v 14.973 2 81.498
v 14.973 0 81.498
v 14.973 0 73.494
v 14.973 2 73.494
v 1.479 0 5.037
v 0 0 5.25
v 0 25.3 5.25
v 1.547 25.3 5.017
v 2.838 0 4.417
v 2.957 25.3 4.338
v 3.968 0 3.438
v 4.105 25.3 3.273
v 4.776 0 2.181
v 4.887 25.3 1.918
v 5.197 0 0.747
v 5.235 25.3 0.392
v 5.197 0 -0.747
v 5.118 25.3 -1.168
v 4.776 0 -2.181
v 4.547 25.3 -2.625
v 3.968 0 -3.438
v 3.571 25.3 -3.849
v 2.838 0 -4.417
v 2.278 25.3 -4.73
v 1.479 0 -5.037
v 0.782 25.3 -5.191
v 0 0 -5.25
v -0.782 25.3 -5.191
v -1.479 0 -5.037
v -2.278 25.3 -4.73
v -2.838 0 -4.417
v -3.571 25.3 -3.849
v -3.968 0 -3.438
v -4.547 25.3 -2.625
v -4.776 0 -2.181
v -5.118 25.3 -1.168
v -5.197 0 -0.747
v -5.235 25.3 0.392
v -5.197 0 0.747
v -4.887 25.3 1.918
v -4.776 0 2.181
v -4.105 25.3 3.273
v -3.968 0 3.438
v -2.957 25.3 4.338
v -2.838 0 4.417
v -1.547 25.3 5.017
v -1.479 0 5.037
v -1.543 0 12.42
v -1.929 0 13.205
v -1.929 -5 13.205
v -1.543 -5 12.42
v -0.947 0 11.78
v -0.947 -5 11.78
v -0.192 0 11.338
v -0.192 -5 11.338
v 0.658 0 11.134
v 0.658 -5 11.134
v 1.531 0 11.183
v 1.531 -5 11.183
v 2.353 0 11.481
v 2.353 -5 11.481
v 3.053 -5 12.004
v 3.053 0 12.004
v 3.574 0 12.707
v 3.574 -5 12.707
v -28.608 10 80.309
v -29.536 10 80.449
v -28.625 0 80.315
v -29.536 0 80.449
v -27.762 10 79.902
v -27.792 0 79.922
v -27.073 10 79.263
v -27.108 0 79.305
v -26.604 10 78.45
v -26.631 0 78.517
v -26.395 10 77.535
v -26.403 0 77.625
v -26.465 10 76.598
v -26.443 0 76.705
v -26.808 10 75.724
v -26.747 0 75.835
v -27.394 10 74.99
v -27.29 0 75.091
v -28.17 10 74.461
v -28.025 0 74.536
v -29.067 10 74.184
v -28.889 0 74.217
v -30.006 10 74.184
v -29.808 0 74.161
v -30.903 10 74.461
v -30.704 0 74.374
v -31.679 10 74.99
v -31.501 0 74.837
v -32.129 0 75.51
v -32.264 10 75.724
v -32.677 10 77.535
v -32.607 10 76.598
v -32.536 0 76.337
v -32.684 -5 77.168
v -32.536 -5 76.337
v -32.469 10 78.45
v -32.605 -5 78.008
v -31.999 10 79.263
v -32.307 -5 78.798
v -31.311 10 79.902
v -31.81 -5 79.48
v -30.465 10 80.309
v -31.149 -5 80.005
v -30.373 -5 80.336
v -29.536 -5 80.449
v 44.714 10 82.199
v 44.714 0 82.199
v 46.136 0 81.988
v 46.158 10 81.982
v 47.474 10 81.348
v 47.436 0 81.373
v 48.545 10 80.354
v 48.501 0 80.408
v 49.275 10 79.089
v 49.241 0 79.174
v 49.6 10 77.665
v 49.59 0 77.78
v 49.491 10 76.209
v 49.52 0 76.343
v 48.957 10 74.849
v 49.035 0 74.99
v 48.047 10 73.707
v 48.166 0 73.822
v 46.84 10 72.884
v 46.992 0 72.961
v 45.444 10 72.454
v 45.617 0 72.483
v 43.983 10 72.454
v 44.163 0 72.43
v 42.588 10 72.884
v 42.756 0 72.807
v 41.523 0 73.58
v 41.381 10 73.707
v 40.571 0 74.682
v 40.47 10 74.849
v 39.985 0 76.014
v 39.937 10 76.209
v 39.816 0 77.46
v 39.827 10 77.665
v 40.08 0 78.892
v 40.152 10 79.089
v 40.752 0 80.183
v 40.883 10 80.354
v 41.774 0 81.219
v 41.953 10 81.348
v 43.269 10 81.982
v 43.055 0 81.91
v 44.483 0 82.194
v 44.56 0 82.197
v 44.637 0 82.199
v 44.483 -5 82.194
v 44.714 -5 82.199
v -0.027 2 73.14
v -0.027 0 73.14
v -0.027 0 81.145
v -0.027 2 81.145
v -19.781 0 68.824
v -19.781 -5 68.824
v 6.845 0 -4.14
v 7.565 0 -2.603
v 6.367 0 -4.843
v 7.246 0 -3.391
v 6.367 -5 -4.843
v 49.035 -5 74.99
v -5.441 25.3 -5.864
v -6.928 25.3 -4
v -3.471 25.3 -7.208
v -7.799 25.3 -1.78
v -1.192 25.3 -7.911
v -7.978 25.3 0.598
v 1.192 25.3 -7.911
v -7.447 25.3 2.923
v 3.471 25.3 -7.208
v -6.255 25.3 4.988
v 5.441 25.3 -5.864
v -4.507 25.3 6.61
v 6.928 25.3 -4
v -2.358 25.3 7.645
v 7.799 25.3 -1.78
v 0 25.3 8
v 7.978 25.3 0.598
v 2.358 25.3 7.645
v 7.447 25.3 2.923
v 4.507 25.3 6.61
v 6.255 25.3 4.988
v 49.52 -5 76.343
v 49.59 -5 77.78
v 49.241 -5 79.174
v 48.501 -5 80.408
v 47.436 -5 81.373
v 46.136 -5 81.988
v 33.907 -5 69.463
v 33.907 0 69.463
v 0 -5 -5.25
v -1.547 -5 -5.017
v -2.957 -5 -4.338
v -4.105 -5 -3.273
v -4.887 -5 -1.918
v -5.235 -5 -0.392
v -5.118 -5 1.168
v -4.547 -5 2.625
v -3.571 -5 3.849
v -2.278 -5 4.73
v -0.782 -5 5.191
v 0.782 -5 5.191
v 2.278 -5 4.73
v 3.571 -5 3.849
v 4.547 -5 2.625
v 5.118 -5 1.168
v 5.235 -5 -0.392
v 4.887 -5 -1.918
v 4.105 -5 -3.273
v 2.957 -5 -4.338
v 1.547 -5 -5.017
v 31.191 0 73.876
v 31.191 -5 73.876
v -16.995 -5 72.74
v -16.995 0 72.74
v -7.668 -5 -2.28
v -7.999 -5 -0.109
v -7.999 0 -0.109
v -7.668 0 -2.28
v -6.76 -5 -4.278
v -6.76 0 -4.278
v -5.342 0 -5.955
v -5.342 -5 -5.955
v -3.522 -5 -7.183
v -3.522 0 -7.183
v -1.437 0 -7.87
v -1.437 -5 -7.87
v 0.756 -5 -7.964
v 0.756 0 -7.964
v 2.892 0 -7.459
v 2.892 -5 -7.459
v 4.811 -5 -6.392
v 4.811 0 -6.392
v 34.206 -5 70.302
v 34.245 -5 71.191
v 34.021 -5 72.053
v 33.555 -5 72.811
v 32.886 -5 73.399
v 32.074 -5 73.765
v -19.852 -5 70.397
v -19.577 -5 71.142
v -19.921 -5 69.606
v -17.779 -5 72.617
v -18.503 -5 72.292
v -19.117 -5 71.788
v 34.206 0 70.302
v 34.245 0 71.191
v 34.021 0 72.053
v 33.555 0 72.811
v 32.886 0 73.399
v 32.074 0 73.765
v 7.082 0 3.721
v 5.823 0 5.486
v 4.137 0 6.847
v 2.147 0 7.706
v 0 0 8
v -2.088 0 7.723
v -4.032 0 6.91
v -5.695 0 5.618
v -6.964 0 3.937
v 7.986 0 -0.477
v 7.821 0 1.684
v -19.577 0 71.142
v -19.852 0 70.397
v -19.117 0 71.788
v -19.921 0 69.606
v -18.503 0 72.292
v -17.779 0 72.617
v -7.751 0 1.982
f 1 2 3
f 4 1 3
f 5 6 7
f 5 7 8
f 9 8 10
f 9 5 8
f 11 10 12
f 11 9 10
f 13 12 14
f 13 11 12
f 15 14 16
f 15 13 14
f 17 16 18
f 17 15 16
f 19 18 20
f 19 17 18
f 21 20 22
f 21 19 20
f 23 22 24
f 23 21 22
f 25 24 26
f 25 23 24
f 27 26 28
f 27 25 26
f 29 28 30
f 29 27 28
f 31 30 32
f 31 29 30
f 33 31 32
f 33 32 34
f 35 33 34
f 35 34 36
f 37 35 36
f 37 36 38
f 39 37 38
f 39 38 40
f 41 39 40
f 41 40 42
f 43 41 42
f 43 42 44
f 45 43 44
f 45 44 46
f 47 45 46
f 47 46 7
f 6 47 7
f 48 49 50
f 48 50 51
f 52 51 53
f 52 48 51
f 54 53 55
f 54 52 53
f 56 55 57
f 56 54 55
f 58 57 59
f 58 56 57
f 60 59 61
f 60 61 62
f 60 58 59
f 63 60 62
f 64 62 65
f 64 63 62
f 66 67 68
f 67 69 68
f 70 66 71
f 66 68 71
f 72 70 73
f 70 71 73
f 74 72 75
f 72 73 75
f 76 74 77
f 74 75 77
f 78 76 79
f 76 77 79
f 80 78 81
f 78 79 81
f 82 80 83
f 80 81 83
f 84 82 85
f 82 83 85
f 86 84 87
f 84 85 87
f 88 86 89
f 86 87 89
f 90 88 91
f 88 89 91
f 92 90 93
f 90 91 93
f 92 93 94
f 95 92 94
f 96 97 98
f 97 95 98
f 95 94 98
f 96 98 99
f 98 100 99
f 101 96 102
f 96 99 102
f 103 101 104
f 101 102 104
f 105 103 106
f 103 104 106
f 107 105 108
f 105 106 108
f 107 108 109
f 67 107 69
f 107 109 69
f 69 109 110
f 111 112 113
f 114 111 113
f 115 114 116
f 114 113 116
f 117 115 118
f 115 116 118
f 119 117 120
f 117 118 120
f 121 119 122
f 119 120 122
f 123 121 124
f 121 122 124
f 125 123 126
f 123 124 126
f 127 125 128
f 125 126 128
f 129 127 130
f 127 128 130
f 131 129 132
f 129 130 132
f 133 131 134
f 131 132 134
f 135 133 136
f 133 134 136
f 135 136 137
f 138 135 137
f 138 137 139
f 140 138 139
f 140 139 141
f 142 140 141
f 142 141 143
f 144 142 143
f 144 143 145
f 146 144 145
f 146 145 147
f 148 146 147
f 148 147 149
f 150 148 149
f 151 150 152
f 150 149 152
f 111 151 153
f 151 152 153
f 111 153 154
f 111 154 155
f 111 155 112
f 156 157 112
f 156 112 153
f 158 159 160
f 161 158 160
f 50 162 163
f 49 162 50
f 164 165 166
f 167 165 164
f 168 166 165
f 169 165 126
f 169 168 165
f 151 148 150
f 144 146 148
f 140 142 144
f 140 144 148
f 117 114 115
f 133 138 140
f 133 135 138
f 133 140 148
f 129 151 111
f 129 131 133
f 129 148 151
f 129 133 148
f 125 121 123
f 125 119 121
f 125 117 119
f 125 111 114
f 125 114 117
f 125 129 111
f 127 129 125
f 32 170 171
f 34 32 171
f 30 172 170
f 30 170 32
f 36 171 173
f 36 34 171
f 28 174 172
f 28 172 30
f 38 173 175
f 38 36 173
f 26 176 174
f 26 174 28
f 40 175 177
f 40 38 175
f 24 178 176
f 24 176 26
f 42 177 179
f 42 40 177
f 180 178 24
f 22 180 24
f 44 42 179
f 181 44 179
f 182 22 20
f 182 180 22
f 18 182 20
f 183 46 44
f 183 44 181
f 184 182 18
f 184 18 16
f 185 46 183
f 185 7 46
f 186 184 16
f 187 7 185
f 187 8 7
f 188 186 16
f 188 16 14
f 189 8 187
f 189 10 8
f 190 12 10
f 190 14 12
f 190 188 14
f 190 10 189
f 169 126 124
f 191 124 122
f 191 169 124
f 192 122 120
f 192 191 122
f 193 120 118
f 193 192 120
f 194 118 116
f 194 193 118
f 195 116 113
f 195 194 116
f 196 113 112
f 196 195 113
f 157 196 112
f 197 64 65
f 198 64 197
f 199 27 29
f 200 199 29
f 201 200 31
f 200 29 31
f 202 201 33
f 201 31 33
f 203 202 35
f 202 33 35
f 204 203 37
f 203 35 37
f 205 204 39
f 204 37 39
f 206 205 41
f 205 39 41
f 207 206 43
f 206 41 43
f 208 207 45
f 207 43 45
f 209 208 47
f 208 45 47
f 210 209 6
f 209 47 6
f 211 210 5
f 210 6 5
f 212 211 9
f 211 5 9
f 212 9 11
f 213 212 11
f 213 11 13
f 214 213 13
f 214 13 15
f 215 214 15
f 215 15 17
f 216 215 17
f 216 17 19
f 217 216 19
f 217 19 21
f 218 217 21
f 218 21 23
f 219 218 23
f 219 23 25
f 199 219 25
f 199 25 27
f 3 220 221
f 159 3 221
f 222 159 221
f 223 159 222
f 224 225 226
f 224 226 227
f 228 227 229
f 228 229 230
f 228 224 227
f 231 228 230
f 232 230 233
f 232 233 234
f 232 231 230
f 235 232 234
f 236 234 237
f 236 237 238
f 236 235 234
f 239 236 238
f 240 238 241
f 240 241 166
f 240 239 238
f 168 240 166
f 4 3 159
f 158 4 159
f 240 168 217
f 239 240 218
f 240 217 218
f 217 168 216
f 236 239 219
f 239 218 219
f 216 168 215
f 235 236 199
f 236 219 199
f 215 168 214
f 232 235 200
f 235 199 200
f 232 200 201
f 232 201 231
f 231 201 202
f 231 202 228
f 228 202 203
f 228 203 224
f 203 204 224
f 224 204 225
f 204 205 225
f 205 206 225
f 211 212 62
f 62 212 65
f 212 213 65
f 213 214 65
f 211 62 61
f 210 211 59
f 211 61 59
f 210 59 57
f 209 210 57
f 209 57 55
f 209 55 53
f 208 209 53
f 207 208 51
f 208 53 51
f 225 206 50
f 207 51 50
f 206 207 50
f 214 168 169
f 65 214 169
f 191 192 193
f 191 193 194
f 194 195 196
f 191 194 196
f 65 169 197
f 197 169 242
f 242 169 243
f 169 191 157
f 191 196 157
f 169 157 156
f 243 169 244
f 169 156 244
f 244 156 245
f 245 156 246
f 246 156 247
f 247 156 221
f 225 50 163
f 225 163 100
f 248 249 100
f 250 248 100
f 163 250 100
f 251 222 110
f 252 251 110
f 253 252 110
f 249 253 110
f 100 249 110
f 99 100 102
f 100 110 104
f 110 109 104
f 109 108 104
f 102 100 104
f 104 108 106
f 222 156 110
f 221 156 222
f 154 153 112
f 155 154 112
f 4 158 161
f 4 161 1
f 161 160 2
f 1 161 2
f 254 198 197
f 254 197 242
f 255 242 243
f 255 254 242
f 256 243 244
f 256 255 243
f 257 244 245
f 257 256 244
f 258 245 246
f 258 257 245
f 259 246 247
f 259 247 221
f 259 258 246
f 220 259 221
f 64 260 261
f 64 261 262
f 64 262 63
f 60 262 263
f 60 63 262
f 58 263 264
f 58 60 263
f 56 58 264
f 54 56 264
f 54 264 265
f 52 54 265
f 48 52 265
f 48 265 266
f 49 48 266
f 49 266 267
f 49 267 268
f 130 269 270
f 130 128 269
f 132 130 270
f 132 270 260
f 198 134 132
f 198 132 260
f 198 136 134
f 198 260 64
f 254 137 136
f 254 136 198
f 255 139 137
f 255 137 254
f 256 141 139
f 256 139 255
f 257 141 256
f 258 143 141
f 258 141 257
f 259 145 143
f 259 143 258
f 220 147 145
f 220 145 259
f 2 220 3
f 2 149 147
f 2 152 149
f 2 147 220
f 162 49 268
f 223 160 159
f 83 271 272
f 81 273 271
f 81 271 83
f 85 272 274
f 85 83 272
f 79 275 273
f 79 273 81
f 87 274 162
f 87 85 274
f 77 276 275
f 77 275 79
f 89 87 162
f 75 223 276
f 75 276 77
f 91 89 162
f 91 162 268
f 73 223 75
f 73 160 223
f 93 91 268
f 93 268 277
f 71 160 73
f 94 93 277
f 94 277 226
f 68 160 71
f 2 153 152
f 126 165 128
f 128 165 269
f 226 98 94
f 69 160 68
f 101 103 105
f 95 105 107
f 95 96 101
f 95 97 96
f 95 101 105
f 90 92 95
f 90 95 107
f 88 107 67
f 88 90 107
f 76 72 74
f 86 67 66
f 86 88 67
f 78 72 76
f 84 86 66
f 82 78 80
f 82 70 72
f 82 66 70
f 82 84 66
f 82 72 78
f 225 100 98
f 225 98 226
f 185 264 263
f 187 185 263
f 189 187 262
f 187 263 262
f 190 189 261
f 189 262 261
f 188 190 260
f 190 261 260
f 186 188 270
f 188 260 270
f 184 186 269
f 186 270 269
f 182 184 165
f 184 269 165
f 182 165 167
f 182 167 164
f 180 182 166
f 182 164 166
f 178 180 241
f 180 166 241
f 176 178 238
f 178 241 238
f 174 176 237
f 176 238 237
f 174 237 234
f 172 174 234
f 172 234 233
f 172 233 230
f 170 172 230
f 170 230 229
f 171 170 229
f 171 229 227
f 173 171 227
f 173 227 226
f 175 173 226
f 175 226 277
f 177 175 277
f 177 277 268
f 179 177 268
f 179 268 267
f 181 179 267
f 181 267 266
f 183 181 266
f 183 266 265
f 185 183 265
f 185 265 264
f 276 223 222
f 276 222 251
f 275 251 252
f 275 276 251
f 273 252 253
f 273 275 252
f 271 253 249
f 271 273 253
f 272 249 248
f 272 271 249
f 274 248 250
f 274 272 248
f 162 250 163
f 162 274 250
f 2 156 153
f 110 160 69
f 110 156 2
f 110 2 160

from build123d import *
from build123d.topology import SkipClean

# Parameters (mm, degrees)
SKETCH_1_R          = 4.9
EXTRUDE_1_DEPTH     = 25.3
SKETCH_1_R_2        = 3.15
EXTRUDE_1_2_DEPTH   = 25.3
SKETCH_1_R_3        = 8
SKETCH_1_R_4        = 5.25
EXTRUDE_1_3_DEPTH   = 25.3
EXTRUDE_START       = 5
SKETCH_2_R          = 3.15
EXTRUDE_2_DEPTH     = 5
SKETCH_3_W          = 101.378011207
SKETCH_3_H          = 57.539128355
CUT_EXTRUDE_1_DEPTH = 15.3
CUT_EXTRUDE_2_DEPTH = 100.289108802
FILLET_1_R          = 3
SKETCH_5_R          = 5.25
CUT_EXTRUDE_3_DEPTH = 100.289108802
EXTRUDE_3_DEPTH     = 2


with BuildPart() as part:
    # Эскиз1 → Бобышка-Вытянуть1 (new body)
    with BuildSketch(Plane(origin=(0, 0, 0), x_dir=(1, 0, 0), z_dir=(0, 1, 0))):
        with Locations(Location((44.713737374, -77.299234731, 0), (0, 0, 270))):
            Circle(SKETCH_1_R)
    extrude(amount=EXTRUDE_1_DEPTH)



with BuildPart() as body_2:
    # Эскиз1 → Extrude 1 2 (new body)
    with BuildSketch(Plane(origin=(0, 0, 0), x_dir=(1, 0, 0), z_dir=(0, 1, 0))):
        with Locations(Location((-29.536262626, -77.299234731, 0), (0, 0, 270))):
            Circle(SKETCH_1_R_2)
    extrude(amount=EXTRUDE_1_2_DEPTH)


with BuildPart() as body_3:
    # Эскиз1 → Extrude 1 3 (new body)
    with BuildSketch(Plane(origin=(0, 0, 0), x_dir=(1, 0, 0), z_dir=(0, 1, 0))):
        with Locations(Location((0, 0, 0), (0, 0, 270))):
            Circle(SKETCH_1_R_3)
        with Locations(Location((0, 0, 0), (0, 0, 270))):
            Circle(SKETCH_1_R_4, mode=Mode.SUBTRACT)
    extrude(amount=EXTRUDE_1_3_DEPTH)


with BuildPart() as part_1:
    with SkipClean():  # the faces are left unmerged after this step: merging them gives an invalid solid
        add(part.part)

        add(body_2.part)  # Бобышка-Вытянуть2 merges body 2

        add(body_3.part)  # Бобышка-Вытянуть2 merges body 3
        # Эскиз2 → Бобышка-Вытянуть2 (add)
        with BuildSketch(Plane.XZ.offset(EXTRUDE_START)):
            with BuildLine():
                Line((44.482889179, 82.193793865), (-29.536262626, 80.449234731))
                ThreePointArc((-29.536262626, 80.449234731), (-27.308876266, 79.526621092), (-26.386262626, 77.299234731))
                ThreePointArc((-26.386262626, 77.299234731), (-29.049069338, 74.187138541), (-32.535559579, 76.336572905))
                Line((-32.535559579, 76.336572905), (-7.999251158, -0.109457316))
                ThreePointArc((-7.999251158, -0.109457316), (-2.503564236, -7.598168603), (6.367372109, -4.843198574))
                Line((6.367372109, -4.843198574), (49.035233225, 74.989543494))
                ThreePointArc((49.035233225, 74.989543494), (48.916563034, 79.818412468), (44.713737374, 82.199234731))
                Line((44.713737374, 82.199234731), (44.482889179, 82.193793865))
            make_face()
            with Locations(Location((-29.536262626, 77.299234731, 0), (0, 0, 90))):
                Circle(SKETCH_2_R)
        extrude(amount=-EXTRUDE_2_DEPTH)

    # Эскиз3 → Вырез-Вытянуть1 (cut)
    with SkipClean():  # the faces are left unmerged after this step: merging them gives an invalid solid
        with BuildSketch(Plane(origin=(0, 25.3, 0), x_dir=(1, 0, 0), z_dir=(0, 1, 0))):
            with Locations((10.685297464, -78.742909524)):
                Rectangle(SKETCH_3_W, SKETCH_3_H)
        extrude(amount=-CUT_EXTRUDE_1_DEPTH, mode=Mode.SUBTRACT)

    # Эскиз4 → Вырез-Вытянуть2 (cut, through all)
    with SkipClean():  # the faces are left unmerged after this step: merging them gives an invalid solid
        with BuildSketch(Plane(origin=(0, 0, 0), x_dir=(1, 0, 0), z_dir=(0, 1, 0))):
            Polygon((36.330866648, -73.997214663), (-21.007135718, -72.645813934), (0.235470884, -6.461736097), align=None)
        extrude(amount=-CUT_EXTRUDE_2_DEPTH, mode=Mode.SUBTRACT)

    # Скругление1
    # the kernel refuses this fillet: 3 mm, written as the material it adds along each edge
    with BuildSketch(Plane(origin=(0.235470884, 0, 6.461736097), x_dir=(0.4713655585699632, 0, 0.8819379287648461), z_dir=(0, -1, 0))) as fillet_1_piece_1:
        with BuildLine():
            CenterArc((FILLET_1_R * 2.36056709959, FILLET_1_R), FILLET_1_R, 135.917656387, 134.082343613)
            Line((FILLET_1_R * 1.642226382, FILLET_1_R * 1.69569146426), (0, 0))
            Line((0, 0), (FILLET_1_R * 2.36056709959, 0))
        make_face()
    extrude(amount=5)
    with BuildSketch(Plane(origin=(36.330866648, 0, 73.997214663), x_dir=(-0.4713655585699637, 0, -0.8819379287648459), z_dir=(0, -1, 0))) as fillet_1_piece_2:
        with BuildLine():
            CenterArc((FILLET_1_R * 1.71380475401, -FILLET_1_R), FILLET_1_R, 90, 119.473130073)
            Line((FILLET_1_R * 0.843218222551, -FILLET_1_R * 1.49201533639), (0, 0))
            Line((0, 0), (FILLET_1_R * 1.71380475401, 0))
        make_face()
    extrude(amount=5)
    with BuildSketch(Plane(origin=(-21.007135718, 0, 72.645813934), x_dir=(0.999722366227584, 0, 0.023562480012096054), z_dir=(0, -1, 0))) as fillet_1_piece_3:
        with BuildLine():
            CenterArc((FILLET_1_R * 1.33781102221, -FILLET_1_R), FILLET_1_R, 90, 106.444526314)
            Line((FILLET_1_R * 0.37871675356, -FILLET_1_R * 1.28308688393), (0, 0))
            Line((0, 0), (FILLET_1_R * 1.33781102221, 0))
        make_face()
    extrude(amount=5)

    # Эскиз5 → Вырез-Вытянуть3 (cut, through all)
    with BuildSketch(Plane(origin=(0, 0, 0), x_dir=(1, 0, 0), z_dir=(0, 1, 0))):
        with Locations(Location((0, 0, 0), (0, 0, 90))):
            Circle(SKETCH_5_R)
    extrude(amount=-CUT_EXTRUDE_3_DEPTH, mode=Mode.SUBTRACT)

    # Эскиз6 → Бобышка-Вытянуть3 (add)
    with BuildSketch(Plane(origin=(0, 0, 0), x_dir=(1, 0, 0), z_dir=(0, 1, 0))):
        Polygon((-0.026686724, -73.14030263), (-0.026686724, -81.144746621), (14.973313276, -81.498281975), (14.973313276, -73.493837984), align=None)
    extrude(amount=EXTRUDE_3_DEPTH)


solid = part_1.part
